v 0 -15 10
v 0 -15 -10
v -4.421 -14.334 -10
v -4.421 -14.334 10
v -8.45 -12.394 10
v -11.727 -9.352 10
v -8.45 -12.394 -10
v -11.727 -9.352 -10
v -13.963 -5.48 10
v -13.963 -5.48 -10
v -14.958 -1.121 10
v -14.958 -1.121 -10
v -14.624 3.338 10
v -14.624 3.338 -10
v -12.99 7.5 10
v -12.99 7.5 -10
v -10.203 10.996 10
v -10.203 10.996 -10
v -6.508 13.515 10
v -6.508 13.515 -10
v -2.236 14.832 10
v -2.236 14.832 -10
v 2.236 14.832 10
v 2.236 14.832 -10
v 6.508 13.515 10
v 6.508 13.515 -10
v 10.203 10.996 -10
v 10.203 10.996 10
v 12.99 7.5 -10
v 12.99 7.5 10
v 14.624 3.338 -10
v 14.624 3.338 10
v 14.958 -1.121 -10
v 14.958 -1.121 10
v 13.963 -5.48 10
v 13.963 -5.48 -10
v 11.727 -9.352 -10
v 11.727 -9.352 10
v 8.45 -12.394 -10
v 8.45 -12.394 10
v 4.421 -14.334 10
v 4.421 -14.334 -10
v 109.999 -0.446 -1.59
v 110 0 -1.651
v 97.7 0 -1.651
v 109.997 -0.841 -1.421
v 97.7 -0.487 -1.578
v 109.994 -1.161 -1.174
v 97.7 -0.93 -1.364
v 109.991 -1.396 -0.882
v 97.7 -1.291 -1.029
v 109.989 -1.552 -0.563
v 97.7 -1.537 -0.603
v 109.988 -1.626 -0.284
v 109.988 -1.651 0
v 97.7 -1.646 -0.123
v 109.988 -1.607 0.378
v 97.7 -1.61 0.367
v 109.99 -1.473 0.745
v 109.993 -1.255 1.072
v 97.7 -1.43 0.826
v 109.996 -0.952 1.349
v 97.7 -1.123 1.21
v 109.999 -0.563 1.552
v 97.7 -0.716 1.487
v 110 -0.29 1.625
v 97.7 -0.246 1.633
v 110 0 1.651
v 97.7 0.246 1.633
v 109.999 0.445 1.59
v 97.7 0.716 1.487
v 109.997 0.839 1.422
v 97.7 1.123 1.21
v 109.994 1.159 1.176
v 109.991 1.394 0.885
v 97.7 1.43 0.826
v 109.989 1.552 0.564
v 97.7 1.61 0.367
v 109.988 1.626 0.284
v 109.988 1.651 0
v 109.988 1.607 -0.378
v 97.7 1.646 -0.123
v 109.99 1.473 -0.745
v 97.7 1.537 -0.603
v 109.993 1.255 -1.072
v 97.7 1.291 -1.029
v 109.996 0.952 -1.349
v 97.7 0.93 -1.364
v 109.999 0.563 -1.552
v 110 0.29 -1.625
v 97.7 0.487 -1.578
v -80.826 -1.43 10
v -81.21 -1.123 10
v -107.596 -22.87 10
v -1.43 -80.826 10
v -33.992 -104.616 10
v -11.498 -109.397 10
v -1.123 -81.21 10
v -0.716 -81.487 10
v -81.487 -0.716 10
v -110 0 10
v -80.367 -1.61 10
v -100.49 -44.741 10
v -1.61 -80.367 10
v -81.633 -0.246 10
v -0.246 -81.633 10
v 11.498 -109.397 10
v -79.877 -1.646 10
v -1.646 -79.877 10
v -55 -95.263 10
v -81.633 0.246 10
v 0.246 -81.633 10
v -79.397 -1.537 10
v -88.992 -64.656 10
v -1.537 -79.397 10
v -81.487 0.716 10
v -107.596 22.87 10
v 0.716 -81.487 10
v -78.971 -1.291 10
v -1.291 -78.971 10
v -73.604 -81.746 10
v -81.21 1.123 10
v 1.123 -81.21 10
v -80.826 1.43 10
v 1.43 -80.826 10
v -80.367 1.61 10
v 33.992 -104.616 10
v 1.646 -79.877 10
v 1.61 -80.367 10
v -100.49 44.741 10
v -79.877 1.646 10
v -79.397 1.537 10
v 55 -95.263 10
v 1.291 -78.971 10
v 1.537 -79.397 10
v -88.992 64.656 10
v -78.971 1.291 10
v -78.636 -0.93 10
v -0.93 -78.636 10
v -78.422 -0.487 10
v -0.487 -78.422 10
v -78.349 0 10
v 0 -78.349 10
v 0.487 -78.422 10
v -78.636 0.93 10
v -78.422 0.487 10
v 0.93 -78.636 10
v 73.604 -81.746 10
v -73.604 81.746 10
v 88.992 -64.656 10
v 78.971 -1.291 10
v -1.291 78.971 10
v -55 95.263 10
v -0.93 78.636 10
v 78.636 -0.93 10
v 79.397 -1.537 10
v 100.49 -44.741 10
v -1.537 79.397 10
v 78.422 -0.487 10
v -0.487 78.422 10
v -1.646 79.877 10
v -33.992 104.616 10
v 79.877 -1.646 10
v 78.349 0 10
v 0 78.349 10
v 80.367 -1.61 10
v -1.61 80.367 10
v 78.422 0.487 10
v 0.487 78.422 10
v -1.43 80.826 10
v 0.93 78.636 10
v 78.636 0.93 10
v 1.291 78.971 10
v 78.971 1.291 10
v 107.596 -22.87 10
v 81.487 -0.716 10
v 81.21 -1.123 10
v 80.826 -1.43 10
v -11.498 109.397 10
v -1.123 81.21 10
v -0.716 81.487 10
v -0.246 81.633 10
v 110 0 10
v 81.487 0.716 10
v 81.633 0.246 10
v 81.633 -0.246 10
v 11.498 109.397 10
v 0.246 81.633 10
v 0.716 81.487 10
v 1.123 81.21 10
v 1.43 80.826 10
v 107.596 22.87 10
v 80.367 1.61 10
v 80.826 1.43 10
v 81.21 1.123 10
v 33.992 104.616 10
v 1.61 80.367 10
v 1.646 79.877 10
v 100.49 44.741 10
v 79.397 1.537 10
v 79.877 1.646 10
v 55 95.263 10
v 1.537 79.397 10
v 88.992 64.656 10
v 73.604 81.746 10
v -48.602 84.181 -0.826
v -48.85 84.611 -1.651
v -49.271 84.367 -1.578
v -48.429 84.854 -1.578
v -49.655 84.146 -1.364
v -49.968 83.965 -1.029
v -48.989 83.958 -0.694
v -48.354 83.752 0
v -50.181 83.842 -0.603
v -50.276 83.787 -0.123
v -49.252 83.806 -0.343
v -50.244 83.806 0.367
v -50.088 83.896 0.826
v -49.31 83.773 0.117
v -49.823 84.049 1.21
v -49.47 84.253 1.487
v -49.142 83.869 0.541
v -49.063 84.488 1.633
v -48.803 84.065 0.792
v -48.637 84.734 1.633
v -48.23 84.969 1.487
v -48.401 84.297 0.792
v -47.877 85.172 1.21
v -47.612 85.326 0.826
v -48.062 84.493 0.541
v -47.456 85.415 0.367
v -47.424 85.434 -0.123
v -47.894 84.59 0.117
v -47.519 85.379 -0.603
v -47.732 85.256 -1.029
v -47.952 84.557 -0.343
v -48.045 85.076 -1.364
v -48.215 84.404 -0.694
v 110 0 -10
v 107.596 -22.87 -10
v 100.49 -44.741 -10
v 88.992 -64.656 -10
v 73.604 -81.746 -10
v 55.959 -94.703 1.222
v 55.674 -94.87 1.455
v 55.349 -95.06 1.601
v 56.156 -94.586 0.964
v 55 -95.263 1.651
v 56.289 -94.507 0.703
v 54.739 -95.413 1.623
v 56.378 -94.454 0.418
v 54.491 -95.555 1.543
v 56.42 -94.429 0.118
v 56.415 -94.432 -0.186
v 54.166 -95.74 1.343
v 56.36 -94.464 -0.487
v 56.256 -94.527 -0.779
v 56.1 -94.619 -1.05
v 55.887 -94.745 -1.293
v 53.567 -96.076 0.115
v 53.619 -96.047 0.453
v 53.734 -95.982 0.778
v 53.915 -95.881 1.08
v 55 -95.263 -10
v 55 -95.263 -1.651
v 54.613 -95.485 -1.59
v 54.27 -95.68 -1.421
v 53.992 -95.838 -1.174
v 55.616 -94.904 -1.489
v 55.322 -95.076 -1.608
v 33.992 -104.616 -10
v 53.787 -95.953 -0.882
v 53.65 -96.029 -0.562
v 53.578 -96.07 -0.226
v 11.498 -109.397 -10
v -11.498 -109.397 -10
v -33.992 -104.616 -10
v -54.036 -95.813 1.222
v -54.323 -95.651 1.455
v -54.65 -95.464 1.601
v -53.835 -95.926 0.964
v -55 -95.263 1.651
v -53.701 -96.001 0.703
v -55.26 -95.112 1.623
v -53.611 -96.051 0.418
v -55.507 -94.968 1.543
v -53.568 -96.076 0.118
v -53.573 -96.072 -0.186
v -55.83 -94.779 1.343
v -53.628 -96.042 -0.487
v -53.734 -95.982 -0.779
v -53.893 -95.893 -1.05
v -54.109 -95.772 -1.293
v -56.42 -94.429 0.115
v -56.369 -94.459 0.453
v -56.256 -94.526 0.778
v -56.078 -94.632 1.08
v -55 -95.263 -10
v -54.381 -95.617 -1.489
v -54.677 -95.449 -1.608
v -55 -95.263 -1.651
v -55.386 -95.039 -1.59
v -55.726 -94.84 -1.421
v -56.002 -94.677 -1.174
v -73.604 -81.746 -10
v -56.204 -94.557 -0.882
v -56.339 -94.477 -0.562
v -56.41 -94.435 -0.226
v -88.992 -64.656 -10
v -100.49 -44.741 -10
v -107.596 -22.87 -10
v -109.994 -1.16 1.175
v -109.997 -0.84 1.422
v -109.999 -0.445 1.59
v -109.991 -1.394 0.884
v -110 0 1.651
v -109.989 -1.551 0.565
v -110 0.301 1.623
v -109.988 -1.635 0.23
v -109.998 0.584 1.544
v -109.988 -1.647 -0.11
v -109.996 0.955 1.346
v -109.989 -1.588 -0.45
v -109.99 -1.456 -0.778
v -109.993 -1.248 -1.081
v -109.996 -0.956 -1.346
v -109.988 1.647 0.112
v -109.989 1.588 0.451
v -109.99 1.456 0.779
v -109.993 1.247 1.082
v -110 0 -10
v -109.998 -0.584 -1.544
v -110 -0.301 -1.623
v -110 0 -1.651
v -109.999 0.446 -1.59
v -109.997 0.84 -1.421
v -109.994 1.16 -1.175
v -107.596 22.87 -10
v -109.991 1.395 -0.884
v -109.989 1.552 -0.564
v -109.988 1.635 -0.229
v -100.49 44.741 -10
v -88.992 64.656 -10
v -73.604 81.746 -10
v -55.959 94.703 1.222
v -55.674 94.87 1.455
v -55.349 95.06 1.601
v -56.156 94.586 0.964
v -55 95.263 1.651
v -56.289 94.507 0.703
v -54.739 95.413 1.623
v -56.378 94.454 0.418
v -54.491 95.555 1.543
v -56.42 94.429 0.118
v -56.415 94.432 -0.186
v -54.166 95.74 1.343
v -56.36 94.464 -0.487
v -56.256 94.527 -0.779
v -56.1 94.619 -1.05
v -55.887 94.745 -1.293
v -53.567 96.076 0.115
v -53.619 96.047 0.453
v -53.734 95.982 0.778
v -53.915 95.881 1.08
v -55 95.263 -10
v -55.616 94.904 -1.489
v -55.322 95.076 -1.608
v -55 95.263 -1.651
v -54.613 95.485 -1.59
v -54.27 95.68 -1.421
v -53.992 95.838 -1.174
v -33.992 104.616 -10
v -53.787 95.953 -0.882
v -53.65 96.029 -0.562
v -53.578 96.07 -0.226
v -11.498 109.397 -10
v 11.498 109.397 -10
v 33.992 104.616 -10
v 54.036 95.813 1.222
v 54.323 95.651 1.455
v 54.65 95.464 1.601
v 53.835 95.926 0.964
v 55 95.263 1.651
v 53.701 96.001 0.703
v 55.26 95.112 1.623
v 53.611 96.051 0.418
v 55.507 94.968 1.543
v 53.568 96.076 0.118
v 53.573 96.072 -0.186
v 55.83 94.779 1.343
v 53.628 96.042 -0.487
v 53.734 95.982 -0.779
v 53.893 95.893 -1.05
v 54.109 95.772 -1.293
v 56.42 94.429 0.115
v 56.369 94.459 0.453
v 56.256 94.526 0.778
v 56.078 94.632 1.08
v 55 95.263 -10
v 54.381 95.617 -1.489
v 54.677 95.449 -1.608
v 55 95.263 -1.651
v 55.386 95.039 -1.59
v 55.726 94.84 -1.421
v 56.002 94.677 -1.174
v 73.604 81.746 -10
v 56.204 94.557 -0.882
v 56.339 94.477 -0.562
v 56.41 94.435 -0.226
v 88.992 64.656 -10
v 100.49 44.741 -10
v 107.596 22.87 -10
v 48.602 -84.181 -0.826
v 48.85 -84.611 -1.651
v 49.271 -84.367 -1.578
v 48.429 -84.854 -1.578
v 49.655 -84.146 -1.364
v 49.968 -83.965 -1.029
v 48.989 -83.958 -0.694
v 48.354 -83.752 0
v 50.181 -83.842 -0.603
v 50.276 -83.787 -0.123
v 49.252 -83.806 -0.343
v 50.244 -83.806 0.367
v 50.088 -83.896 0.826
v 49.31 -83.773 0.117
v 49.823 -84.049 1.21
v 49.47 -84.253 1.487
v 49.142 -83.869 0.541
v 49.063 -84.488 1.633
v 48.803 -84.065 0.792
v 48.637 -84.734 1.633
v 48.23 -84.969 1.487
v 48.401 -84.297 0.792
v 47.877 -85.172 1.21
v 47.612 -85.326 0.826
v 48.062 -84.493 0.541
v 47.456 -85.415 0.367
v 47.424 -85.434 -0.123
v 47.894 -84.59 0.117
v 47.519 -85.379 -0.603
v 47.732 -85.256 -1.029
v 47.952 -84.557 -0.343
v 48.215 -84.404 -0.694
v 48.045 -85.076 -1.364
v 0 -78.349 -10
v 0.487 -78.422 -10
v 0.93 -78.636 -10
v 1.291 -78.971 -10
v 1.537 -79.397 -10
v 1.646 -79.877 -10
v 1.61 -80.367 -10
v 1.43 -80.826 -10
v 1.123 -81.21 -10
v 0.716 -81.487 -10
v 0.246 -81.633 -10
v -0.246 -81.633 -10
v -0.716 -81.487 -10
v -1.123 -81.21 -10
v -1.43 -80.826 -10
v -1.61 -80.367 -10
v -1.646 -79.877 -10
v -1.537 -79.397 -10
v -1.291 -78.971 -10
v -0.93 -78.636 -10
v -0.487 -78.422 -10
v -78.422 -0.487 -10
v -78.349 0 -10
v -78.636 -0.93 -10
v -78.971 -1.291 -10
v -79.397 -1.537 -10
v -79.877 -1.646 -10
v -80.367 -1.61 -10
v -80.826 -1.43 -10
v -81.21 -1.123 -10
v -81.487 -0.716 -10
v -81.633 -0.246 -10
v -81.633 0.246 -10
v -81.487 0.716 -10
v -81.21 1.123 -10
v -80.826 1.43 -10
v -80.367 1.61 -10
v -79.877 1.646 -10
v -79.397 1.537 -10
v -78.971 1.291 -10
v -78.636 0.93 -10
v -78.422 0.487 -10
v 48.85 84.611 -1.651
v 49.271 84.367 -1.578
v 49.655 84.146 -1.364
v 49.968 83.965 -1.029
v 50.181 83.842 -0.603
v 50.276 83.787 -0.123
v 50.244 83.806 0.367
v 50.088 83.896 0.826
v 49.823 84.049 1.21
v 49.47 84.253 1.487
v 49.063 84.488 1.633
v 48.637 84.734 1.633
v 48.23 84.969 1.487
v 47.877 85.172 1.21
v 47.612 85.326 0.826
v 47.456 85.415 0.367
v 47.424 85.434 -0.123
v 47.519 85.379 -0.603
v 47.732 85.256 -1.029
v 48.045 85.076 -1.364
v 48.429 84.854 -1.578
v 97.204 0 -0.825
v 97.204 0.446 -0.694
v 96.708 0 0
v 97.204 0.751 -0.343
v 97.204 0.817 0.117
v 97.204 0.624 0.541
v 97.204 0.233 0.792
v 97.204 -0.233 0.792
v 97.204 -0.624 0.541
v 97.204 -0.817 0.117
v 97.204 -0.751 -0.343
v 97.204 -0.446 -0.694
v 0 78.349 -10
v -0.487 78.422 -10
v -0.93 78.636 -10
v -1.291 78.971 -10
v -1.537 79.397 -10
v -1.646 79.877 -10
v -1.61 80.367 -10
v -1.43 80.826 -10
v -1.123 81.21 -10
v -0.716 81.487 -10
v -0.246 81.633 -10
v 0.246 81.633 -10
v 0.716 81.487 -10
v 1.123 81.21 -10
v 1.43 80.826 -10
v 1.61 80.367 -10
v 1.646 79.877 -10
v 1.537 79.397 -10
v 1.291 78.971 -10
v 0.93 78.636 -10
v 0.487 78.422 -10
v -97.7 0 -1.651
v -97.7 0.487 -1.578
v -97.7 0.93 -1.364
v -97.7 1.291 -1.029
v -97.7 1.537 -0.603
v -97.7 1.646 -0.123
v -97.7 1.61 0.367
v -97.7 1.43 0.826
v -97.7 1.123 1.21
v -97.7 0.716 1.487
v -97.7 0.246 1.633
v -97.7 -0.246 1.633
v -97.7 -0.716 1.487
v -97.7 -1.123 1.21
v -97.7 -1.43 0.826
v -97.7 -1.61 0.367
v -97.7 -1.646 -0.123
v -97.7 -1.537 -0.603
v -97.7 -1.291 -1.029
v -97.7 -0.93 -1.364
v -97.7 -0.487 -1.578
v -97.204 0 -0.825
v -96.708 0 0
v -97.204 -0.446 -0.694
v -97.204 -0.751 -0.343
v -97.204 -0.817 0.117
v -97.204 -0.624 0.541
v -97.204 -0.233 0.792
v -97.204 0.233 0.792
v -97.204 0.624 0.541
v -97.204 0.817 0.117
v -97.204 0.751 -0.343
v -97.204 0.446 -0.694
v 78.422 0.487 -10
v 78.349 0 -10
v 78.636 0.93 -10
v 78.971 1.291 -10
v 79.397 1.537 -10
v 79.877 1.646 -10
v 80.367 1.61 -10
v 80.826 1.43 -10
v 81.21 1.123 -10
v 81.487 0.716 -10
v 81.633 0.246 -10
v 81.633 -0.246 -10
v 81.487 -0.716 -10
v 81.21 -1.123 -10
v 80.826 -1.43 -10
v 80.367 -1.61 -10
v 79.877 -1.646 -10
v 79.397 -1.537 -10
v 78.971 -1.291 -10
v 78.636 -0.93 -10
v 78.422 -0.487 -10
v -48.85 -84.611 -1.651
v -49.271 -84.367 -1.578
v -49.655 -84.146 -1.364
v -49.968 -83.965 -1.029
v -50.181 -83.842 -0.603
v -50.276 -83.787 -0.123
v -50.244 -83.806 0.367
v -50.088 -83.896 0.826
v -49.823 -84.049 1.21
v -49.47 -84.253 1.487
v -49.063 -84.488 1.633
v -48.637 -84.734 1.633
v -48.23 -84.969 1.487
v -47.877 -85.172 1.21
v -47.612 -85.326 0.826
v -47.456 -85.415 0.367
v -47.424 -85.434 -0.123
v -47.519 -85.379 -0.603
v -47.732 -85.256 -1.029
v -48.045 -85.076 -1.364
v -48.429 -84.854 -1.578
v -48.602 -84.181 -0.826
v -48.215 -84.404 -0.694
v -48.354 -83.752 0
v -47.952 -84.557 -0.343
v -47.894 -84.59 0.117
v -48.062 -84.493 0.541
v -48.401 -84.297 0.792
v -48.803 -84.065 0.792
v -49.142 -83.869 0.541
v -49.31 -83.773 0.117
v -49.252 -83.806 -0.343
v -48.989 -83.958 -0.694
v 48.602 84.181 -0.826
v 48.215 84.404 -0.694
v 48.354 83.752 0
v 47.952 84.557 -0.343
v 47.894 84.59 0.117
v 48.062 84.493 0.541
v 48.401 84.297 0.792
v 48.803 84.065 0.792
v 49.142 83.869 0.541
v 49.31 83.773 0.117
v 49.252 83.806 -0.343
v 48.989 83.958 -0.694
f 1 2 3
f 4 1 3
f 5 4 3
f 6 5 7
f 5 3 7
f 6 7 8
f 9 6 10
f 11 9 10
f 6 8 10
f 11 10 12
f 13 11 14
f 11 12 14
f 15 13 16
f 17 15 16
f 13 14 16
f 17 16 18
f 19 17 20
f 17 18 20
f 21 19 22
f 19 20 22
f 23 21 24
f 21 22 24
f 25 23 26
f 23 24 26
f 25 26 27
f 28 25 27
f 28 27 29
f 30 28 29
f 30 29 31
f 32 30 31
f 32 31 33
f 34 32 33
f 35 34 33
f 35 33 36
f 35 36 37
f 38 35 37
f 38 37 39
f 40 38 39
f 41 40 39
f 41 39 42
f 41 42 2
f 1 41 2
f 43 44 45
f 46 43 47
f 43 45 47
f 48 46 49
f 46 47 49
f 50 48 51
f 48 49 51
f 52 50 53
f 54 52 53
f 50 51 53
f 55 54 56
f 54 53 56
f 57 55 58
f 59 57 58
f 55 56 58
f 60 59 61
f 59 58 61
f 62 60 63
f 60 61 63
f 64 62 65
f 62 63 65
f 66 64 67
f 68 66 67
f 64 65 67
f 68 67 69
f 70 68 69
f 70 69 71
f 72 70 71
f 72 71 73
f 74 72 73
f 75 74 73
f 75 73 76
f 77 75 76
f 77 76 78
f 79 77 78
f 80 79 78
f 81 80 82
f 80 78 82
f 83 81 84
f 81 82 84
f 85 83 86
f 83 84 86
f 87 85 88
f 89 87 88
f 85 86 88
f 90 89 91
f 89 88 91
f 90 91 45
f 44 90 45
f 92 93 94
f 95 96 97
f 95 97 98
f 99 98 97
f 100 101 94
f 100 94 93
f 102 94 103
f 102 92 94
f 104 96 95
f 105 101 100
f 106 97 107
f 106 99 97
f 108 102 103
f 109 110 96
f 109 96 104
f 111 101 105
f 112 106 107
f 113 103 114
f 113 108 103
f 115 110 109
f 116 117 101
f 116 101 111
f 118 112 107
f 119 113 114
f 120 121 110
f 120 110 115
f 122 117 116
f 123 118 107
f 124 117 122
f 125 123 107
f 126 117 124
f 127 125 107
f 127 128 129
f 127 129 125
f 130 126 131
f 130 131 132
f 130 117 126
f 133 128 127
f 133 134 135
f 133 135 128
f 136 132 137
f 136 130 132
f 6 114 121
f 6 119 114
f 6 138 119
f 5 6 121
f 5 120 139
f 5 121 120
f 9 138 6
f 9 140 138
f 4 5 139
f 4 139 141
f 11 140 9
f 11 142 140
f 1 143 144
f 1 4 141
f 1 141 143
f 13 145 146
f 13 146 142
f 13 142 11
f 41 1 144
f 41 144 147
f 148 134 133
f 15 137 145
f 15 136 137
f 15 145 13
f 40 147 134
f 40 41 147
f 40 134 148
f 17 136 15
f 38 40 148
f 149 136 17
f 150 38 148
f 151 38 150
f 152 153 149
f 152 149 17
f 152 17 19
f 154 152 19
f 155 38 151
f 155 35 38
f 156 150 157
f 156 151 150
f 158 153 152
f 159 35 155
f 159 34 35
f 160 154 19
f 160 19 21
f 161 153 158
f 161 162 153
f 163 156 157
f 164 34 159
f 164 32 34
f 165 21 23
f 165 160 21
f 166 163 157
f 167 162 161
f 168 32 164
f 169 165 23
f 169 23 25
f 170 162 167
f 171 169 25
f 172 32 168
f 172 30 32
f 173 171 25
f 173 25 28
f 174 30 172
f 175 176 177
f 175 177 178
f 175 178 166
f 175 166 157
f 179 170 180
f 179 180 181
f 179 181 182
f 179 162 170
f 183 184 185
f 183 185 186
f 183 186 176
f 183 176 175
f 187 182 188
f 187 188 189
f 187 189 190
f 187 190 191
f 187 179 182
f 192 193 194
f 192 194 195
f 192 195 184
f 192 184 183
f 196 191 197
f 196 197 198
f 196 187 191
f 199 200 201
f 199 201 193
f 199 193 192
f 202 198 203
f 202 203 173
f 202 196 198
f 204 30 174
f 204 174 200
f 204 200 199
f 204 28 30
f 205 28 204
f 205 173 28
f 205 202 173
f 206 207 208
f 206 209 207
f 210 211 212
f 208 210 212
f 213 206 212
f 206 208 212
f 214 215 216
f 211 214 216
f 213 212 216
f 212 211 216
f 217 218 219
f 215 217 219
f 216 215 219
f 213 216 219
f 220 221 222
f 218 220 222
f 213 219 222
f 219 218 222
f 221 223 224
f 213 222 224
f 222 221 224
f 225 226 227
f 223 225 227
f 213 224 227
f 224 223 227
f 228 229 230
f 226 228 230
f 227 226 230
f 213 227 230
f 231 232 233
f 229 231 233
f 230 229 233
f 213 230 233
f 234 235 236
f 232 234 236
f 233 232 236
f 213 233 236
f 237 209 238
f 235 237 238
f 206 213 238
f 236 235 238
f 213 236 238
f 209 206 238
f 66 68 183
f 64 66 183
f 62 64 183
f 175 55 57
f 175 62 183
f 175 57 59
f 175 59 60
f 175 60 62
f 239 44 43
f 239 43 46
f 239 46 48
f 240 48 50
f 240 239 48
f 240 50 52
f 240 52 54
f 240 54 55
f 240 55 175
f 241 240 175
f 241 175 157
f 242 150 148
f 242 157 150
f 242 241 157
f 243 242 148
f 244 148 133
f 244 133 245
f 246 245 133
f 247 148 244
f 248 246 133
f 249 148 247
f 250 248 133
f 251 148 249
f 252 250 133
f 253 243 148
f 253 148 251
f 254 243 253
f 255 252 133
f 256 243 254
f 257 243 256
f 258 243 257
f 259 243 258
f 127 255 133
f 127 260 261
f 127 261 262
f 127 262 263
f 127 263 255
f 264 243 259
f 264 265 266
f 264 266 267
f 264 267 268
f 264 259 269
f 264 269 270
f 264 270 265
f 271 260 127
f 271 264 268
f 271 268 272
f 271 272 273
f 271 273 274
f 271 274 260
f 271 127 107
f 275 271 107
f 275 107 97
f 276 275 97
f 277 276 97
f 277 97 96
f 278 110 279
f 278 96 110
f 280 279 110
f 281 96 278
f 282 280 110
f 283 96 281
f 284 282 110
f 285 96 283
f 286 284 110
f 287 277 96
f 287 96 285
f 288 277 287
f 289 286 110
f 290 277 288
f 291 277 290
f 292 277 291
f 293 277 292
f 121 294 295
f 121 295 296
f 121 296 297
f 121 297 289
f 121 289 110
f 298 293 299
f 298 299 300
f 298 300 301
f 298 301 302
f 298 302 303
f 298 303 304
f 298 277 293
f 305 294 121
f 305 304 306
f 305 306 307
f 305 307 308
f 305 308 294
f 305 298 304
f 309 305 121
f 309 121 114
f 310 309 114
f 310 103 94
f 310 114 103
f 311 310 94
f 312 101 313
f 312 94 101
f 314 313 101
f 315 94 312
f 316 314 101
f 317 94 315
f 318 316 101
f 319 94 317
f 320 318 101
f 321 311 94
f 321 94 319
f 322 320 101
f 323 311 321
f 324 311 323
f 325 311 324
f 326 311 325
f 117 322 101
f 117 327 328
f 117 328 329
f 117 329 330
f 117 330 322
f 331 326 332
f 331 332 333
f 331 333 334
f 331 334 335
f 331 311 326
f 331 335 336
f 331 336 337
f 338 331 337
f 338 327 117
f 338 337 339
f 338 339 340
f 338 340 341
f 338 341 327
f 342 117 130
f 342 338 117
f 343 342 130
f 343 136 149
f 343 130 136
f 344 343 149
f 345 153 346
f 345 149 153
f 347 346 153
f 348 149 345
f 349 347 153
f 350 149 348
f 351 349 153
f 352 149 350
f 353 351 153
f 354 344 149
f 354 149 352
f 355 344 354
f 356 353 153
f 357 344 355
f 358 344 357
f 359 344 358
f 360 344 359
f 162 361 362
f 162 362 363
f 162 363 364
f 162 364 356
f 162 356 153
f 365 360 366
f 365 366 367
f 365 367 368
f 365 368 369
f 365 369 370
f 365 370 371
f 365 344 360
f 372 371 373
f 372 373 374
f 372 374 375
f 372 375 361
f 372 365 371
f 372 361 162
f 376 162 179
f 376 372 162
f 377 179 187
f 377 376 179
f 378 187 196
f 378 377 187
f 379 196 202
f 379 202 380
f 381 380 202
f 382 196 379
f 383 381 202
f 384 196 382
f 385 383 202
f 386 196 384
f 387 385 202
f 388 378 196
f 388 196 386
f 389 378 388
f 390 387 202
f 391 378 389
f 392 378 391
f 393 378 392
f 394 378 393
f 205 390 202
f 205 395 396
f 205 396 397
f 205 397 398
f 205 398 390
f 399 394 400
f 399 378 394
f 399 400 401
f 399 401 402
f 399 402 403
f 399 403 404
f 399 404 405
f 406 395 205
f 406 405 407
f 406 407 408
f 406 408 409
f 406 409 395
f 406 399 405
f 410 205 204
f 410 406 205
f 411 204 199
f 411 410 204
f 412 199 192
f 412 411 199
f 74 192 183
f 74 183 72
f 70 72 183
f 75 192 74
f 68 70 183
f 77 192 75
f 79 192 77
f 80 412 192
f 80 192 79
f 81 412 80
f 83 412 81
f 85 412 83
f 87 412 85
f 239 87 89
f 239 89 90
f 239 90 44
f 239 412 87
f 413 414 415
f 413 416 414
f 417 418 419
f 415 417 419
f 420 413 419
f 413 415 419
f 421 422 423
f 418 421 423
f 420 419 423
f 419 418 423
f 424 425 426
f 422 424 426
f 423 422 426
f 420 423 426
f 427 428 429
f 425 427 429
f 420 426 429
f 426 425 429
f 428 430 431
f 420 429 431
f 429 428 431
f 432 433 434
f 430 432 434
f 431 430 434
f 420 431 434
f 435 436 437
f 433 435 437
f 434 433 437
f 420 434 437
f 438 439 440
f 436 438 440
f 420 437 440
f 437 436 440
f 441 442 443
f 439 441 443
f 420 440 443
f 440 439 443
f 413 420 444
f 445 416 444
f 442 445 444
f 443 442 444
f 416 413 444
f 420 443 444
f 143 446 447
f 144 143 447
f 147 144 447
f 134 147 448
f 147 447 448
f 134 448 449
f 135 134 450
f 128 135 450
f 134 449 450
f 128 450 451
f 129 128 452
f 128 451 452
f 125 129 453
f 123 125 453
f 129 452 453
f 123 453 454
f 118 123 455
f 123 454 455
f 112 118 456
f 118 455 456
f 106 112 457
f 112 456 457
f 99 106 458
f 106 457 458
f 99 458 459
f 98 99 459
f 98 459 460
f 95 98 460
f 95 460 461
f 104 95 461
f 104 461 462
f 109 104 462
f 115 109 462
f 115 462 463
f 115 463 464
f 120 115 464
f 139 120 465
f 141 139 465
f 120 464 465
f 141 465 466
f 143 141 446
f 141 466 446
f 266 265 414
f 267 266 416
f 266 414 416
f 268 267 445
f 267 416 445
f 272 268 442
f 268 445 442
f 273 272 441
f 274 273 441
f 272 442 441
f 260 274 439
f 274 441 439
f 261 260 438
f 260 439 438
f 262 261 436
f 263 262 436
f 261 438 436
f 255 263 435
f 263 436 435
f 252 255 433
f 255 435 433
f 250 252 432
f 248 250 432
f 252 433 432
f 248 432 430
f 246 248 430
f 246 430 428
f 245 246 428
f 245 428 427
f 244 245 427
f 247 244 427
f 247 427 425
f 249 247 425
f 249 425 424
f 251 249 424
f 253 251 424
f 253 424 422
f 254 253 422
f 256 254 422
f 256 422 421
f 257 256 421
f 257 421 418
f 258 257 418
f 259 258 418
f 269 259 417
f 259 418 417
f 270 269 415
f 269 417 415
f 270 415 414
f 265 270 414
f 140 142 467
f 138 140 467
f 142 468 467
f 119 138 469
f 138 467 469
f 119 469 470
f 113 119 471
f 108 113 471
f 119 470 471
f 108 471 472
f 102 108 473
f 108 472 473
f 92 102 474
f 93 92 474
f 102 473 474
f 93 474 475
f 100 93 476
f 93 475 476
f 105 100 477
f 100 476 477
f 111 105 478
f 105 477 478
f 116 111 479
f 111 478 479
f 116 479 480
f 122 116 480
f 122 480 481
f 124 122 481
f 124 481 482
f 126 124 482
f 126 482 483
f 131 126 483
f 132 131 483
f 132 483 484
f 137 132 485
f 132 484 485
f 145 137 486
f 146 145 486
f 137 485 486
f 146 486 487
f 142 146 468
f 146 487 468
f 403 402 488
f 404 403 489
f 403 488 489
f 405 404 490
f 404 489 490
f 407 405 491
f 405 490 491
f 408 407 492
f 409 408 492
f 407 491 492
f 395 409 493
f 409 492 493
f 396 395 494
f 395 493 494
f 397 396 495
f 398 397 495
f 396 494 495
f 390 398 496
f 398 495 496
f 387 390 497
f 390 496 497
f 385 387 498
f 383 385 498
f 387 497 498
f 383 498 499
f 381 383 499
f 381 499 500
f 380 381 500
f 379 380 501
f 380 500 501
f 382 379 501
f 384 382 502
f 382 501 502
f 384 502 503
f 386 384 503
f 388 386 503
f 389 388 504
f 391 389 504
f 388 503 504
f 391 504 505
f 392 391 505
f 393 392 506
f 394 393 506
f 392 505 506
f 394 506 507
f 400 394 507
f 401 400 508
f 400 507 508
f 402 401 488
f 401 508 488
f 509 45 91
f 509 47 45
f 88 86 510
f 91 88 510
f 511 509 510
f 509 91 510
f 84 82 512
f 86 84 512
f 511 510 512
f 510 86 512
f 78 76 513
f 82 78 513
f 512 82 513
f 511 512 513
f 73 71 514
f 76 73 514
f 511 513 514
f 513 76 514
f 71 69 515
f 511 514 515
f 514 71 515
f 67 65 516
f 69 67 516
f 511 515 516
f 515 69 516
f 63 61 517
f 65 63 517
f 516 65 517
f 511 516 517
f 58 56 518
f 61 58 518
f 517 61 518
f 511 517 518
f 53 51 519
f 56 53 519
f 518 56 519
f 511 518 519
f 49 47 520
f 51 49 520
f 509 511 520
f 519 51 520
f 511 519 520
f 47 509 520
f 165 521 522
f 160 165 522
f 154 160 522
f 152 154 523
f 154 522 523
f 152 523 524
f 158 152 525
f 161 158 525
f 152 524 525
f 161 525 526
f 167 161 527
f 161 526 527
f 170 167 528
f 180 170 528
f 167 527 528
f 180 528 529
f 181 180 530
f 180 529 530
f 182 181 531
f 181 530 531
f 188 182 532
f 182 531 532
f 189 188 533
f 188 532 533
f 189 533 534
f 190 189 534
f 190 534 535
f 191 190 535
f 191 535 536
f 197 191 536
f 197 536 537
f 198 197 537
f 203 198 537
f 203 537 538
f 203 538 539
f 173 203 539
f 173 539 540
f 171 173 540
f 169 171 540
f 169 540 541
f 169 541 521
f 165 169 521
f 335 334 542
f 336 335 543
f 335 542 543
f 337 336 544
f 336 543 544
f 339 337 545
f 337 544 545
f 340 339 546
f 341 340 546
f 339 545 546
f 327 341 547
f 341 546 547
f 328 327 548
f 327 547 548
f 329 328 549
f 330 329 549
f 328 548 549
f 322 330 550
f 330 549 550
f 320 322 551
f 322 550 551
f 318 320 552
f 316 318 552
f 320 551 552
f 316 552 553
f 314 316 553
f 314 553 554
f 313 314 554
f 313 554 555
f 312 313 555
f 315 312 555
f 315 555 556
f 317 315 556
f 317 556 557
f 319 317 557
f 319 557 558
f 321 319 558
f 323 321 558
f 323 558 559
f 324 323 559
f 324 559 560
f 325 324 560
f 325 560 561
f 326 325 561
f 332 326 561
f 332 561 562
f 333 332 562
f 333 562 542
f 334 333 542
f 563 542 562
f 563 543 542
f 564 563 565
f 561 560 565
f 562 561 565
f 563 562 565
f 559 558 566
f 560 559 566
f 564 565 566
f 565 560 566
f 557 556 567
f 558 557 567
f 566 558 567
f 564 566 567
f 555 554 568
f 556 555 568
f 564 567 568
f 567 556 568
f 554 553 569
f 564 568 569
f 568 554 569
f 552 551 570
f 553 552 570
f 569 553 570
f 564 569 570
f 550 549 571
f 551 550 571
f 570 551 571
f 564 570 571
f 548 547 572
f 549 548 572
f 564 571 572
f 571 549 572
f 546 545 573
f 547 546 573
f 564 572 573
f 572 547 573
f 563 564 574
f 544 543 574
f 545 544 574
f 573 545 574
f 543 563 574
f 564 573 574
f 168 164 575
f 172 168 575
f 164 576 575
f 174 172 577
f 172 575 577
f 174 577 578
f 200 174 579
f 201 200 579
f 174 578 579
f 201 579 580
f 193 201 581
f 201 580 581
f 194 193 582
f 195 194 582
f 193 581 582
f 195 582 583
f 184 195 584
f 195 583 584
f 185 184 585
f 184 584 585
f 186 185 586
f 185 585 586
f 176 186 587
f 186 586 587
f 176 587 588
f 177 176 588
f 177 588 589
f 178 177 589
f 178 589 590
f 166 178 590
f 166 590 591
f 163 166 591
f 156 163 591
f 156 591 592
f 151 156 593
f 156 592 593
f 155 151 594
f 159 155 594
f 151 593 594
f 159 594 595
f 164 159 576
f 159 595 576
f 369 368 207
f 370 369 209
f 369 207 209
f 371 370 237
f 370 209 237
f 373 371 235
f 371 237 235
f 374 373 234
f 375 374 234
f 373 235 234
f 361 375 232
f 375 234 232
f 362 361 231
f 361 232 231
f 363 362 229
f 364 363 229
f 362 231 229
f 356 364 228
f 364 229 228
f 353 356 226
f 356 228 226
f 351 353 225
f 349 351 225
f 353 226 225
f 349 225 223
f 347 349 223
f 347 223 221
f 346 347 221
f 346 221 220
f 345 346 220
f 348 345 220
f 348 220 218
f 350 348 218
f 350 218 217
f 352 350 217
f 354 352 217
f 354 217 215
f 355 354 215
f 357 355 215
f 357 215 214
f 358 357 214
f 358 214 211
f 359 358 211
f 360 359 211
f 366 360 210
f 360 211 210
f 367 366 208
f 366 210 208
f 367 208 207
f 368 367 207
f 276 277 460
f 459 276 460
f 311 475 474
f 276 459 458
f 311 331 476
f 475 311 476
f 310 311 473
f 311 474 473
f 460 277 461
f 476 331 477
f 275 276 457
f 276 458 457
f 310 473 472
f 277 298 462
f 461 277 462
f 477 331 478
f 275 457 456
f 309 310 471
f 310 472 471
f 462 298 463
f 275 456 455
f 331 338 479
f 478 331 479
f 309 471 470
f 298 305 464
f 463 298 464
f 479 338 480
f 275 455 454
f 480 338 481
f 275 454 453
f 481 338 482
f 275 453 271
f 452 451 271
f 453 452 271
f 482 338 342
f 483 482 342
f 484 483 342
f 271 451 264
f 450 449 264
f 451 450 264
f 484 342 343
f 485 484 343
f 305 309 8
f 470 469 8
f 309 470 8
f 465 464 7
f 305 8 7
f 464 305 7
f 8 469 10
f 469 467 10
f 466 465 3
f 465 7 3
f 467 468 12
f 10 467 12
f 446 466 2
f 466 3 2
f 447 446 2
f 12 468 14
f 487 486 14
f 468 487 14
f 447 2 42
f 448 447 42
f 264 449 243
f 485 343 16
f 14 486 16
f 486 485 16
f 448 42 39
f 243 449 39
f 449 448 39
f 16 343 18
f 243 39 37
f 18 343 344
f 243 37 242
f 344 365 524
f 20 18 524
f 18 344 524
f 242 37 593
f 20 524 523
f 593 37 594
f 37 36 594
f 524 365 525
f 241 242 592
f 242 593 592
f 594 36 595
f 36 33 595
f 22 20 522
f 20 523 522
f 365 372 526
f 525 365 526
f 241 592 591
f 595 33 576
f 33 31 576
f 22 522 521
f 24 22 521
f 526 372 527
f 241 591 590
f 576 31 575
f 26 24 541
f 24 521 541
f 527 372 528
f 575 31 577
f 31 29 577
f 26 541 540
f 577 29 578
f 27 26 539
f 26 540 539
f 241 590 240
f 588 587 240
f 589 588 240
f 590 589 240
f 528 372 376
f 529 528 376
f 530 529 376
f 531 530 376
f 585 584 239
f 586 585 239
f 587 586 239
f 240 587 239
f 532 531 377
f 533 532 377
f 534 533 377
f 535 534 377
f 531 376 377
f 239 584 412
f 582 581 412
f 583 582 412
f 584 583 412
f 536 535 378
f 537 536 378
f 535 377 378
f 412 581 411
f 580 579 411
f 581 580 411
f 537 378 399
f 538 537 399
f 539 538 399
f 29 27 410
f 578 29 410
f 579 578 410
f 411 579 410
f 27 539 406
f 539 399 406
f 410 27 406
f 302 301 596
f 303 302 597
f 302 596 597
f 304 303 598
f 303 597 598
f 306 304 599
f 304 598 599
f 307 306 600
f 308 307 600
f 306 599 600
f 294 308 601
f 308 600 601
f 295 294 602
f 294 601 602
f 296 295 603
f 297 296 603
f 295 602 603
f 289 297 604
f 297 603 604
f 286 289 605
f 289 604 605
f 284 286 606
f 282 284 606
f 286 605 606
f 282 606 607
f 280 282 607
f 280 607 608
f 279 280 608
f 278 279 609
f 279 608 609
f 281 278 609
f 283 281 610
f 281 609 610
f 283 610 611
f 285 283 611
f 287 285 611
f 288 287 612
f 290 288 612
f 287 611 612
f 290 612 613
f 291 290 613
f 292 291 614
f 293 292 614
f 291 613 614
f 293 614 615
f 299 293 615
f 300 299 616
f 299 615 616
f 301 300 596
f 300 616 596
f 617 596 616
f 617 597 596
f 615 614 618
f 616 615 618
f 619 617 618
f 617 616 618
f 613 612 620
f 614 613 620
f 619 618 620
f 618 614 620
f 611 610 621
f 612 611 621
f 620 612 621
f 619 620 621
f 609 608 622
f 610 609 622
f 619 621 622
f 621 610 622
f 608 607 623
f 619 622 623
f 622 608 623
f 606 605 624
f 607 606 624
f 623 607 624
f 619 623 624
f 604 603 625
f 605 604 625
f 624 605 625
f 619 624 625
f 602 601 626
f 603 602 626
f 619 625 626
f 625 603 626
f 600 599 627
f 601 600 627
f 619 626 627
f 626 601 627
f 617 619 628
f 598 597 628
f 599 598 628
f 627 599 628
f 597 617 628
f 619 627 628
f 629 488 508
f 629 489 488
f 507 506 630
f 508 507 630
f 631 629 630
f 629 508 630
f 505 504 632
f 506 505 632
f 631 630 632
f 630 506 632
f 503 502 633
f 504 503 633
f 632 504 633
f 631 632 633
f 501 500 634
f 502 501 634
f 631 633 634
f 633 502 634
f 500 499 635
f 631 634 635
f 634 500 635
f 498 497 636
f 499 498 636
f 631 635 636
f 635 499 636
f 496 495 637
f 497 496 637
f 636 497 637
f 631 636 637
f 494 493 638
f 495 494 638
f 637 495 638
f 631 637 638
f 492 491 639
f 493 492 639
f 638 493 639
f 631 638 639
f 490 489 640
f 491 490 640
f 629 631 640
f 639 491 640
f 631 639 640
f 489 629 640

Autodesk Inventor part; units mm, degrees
ref_plane "XZ Plane" through (0, 0, 0) normal (0, 1, 0) x (-1, 0, 0)
ref_plane "XY Plane" through (0, 0, 0) normal (0, 0, 1) x (1, 0, 0)
sketch "Sketch1" plane through (0, 0, 0) normal (0, 0, 1) x (1, 0, 0)
  circle A0 centre (0, 0) radius 110
  dimension "d0" = 220
extrude "Extrusion1" add sketch "Sketch1" along normal mid plane 20
sketch "Sketch3" plane through (0, 0, 10) normal (0, 0, 1) x (1, 0, 0)
  point P0 (0, 0)
  point P1 (0, 0)
hole "Hole1" at (0, 0, 10) direction (0, 0, -1) diameter 30 end through all
ref_plane "Work Plane1" through (110, 0, 0) normal (1, 0, 0) x (0, 1, 0)
sketch "Sketch4" plane through (110, 0, 0) normal (1, 0, 0) x (0, 1, 0)
  point P0 (0, 0)
  point P1 (0, 0)
hole "Hole2" at (110, 0, 0) direction (-1, 0, 0) diameter 3.302 depth 12.3 tip angle 118 thread size "8-32 UNC" class "2B" standard "ANSI Unified Screw Threads"
pattern_circular "Circular Pattern1" count 6 over 360 about axis through (0, 0, -10) along (0, 0, 1) of "Hole2"
sketch "Sketch5" plane through (0, 0, 10) normal (0, 0, 1) x (1, 0, 0)
  point P0 (0, 0)
  point P1 (0, 80)
  dimension "d21" = 80
hole "Hole3" at (0, 80, 10) direction (0, 0, -1) diameter 3.302 end through all thread size "8-32 UNC" class "2B" standard "ANSI Unified Screw Threads"
pattern_circular "Circular Pattern2" count 4 over 360 about axis through (0, 0, -10) along (0, 0, 1) of "Hole3"
properties part number "Top_Lever Centre" material "Wood (Oak)"
